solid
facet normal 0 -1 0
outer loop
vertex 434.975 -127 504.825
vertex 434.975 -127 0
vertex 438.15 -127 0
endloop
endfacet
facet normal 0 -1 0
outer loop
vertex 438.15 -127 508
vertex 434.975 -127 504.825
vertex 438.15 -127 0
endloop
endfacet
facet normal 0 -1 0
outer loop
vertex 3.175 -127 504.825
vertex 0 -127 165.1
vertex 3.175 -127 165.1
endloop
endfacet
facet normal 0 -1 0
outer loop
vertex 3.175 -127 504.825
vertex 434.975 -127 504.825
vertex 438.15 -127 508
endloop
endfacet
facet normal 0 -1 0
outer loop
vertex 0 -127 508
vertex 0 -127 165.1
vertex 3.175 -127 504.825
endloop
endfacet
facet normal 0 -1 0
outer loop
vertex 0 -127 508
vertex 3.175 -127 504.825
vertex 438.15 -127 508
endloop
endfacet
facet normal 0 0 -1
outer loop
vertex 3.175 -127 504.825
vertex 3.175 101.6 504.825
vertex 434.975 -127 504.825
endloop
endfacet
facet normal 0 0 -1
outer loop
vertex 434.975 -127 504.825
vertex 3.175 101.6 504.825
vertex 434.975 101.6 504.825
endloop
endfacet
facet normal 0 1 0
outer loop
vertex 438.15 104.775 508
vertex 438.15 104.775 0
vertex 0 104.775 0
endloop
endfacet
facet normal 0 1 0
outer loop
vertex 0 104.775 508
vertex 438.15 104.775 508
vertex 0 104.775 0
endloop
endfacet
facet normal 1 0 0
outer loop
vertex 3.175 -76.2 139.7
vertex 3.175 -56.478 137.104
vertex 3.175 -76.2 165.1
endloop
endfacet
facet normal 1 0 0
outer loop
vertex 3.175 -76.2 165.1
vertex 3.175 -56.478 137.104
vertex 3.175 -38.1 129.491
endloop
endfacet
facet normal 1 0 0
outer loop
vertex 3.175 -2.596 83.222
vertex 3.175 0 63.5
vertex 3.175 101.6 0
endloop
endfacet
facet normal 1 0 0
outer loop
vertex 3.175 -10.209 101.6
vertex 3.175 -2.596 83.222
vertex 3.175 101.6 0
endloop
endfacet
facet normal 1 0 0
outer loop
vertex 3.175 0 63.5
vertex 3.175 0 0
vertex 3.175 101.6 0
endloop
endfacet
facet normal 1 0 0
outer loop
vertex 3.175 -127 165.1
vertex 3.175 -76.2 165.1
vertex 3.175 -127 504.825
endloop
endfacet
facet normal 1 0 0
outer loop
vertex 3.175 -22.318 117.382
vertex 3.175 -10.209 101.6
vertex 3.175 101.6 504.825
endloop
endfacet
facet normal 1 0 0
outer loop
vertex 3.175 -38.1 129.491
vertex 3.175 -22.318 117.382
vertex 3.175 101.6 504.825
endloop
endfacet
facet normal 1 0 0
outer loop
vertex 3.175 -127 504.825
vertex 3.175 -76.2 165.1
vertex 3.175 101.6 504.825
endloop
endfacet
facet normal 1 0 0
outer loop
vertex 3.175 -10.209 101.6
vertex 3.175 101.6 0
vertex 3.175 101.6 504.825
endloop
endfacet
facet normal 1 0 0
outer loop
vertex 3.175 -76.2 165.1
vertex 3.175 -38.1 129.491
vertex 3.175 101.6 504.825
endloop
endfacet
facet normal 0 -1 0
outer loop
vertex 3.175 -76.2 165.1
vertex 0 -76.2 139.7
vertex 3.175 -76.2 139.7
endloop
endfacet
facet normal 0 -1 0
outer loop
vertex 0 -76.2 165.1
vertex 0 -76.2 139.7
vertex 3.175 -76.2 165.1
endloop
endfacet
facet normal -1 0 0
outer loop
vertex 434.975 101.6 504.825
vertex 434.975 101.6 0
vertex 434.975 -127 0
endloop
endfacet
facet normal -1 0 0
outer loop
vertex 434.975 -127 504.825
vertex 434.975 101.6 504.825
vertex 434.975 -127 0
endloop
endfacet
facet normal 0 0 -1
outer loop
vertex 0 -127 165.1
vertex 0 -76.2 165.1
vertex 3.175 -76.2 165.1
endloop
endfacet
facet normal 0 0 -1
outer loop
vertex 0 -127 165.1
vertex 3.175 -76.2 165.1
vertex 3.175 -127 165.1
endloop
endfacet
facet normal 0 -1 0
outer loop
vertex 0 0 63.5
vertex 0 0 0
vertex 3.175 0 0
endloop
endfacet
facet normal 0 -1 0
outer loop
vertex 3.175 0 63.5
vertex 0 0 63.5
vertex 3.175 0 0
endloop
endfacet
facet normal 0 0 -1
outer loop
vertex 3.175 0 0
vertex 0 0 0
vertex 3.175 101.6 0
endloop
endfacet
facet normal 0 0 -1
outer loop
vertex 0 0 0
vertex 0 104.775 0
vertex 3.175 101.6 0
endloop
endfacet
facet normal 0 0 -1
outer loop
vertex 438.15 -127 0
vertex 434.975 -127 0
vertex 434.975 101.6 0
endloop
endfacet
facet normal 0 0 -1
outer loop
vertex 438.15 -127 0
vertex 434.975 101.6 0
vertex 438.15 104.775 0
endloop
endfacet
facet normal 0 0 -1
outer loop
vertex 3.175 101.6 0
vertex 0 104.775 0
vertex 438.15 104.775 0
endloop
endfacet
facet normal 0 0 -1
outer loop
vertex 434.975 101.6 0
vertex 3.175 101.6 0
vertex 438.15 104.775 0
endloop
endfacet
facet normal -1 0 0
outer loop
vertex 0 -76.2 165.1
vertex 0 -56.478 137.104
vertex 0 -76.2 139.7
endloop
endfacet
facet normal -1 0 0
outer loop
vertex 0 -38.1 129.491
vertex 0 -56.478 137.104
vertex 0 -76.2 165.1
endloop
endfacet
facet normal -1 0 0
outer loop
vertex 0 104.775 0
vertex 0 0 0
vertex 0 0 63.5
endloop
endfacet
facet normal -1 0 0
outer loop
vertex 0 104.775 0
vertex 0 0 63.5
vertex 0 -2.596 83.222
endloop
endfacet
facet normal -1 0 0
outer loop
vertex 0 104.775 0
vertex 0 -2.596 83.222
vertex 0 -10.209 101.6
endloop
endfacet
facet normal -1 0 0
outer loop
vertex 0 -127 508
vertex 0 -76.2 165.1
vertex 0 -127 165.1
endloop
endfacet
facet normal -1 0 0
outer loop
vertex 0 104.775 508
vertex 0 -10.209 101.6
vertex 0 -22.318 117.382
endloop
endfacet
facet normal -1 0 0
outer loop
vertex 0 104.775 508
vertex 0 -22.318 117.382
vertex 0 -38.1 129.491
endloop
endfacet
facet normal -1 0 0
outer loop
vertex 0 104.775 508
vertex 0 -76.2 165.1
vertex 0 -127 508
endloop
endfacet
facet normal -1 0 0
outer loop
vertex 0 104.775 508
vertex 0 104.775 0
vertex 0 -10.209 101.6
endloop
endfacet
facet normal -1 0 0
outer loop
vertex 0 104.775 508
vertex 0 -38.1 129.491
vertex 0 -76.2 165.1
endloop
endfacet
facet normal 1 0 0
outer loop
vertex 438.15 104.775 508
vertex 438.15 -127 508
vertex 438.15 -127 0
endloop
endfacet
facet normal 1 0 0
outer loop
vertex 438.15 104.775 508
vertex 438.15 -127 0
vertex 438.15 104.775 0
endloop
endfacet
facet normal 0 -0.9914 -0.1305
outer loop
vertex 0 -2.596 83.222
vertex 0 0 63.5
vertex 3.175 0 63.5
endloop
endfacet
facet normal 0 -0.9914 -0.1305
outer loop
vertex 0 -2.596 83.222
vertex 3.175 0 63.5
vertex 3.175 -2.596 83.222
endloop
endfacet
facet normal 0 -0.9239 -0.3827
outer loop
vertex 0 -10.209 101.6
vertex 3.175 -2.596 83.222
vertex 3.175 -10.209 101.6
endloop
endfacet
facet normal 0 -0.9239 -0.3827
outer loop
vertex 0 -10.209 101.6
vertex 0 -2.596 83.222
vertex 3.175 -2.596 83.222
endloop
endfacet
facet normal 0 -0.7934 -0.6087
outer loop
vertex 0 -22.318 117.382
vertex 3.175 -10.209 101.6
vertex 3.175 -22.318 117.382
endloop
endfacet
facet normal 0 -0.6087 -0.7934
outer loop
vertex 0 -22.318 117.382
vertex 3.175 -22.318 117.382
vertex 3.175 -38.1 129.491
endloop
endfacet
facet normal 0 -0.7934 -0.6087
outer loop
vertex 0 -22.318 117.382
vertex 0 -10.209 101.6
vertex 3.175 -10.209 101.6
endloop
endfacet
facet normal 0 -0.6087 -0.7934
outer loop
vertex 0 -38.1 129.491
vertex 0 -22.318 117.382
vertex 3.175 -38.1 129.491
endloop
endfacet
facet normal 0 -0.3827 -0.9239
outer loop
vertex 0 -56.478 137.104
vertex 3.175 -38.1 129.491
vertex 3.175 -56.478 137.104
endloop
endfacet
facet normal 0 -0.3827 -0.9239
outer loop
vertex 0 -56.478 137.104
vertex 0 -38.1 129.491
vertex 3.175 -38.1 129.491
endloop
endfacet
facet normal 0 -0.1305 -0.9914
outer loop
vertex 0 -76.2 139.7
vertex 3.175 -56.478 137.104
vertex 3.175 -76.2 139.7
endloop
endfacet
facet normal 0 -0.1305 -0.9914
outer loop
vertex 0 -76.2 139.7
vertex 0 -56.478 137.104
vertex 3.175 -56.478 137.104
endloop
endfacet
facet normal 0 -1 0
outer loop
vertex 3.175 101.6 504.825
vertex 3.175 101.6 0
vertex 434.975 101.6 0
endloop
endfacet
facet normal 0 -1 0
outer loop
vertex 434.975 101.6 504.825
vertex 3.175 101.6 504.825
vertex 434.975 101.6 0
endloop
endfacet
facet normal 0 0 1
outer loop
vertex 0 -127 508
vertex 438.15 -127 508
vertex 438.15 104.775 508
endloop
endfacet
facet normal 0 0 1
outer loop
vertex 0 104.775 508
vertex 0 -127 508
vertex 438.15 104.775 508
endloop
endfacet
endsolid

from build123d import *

# Parameters (mm, degrees)
BOSS_EXTRUDE1_DEPTH = 508
BOSS_EXTRUDE2_DEPTH = 3.175
SKETCH3_W           = 438.15
SKETCH3_H           = 231.775
BOSS_EXTRUDE3_DEPTH = 3.175


with BuildPart() as part:
    # Sketch1 → Boss-Extrude1 (new body)
    with BuildSketch(Plane.XY):
        Polygon((0, 0), (3.175, 0), (3.175, 101.6), (434.975, 101.6), (434.975, -127), (438.15, -127), (438.15, 104.775), (0, 104.775), align=None)
    extrude(amount=BOSS_EXTRUDE1_DEPTH)

    # Sketch2 → Boss-Extrude2 (add)
    with BuildSketch(Plane.ZY):
        with BuildLine():
            Line((139.7, -76.2), (165.1, -76.2))
            Line((165.1, -76.2), (165.1, -127))
            Line((165.1, -127), (508, -127))
            Line((508, -127), (508, -76.2))
            Line((508, -76.2), (508, 0))
            Line((508, 0), (63.5, 0))
            ThreePointArc((63.5, 0), (117.381536726, -22.318463274), (139.7, -76.2))
        make_face()
    extrude(amount=-BOSS_EXTRUDE2_DEPTH)

    # Sketch3 → Boss-Extrude3 (add)
    with BuildSketch(Plane.XY.offset(508)):
        with Locations((219.075, -11.1125)):
            Rectangle(SKETCH3_W, SKETCH3_H)
    extrude(amount=-BOSS_EXTRUDE3_DEPTH)


solid = part.part
